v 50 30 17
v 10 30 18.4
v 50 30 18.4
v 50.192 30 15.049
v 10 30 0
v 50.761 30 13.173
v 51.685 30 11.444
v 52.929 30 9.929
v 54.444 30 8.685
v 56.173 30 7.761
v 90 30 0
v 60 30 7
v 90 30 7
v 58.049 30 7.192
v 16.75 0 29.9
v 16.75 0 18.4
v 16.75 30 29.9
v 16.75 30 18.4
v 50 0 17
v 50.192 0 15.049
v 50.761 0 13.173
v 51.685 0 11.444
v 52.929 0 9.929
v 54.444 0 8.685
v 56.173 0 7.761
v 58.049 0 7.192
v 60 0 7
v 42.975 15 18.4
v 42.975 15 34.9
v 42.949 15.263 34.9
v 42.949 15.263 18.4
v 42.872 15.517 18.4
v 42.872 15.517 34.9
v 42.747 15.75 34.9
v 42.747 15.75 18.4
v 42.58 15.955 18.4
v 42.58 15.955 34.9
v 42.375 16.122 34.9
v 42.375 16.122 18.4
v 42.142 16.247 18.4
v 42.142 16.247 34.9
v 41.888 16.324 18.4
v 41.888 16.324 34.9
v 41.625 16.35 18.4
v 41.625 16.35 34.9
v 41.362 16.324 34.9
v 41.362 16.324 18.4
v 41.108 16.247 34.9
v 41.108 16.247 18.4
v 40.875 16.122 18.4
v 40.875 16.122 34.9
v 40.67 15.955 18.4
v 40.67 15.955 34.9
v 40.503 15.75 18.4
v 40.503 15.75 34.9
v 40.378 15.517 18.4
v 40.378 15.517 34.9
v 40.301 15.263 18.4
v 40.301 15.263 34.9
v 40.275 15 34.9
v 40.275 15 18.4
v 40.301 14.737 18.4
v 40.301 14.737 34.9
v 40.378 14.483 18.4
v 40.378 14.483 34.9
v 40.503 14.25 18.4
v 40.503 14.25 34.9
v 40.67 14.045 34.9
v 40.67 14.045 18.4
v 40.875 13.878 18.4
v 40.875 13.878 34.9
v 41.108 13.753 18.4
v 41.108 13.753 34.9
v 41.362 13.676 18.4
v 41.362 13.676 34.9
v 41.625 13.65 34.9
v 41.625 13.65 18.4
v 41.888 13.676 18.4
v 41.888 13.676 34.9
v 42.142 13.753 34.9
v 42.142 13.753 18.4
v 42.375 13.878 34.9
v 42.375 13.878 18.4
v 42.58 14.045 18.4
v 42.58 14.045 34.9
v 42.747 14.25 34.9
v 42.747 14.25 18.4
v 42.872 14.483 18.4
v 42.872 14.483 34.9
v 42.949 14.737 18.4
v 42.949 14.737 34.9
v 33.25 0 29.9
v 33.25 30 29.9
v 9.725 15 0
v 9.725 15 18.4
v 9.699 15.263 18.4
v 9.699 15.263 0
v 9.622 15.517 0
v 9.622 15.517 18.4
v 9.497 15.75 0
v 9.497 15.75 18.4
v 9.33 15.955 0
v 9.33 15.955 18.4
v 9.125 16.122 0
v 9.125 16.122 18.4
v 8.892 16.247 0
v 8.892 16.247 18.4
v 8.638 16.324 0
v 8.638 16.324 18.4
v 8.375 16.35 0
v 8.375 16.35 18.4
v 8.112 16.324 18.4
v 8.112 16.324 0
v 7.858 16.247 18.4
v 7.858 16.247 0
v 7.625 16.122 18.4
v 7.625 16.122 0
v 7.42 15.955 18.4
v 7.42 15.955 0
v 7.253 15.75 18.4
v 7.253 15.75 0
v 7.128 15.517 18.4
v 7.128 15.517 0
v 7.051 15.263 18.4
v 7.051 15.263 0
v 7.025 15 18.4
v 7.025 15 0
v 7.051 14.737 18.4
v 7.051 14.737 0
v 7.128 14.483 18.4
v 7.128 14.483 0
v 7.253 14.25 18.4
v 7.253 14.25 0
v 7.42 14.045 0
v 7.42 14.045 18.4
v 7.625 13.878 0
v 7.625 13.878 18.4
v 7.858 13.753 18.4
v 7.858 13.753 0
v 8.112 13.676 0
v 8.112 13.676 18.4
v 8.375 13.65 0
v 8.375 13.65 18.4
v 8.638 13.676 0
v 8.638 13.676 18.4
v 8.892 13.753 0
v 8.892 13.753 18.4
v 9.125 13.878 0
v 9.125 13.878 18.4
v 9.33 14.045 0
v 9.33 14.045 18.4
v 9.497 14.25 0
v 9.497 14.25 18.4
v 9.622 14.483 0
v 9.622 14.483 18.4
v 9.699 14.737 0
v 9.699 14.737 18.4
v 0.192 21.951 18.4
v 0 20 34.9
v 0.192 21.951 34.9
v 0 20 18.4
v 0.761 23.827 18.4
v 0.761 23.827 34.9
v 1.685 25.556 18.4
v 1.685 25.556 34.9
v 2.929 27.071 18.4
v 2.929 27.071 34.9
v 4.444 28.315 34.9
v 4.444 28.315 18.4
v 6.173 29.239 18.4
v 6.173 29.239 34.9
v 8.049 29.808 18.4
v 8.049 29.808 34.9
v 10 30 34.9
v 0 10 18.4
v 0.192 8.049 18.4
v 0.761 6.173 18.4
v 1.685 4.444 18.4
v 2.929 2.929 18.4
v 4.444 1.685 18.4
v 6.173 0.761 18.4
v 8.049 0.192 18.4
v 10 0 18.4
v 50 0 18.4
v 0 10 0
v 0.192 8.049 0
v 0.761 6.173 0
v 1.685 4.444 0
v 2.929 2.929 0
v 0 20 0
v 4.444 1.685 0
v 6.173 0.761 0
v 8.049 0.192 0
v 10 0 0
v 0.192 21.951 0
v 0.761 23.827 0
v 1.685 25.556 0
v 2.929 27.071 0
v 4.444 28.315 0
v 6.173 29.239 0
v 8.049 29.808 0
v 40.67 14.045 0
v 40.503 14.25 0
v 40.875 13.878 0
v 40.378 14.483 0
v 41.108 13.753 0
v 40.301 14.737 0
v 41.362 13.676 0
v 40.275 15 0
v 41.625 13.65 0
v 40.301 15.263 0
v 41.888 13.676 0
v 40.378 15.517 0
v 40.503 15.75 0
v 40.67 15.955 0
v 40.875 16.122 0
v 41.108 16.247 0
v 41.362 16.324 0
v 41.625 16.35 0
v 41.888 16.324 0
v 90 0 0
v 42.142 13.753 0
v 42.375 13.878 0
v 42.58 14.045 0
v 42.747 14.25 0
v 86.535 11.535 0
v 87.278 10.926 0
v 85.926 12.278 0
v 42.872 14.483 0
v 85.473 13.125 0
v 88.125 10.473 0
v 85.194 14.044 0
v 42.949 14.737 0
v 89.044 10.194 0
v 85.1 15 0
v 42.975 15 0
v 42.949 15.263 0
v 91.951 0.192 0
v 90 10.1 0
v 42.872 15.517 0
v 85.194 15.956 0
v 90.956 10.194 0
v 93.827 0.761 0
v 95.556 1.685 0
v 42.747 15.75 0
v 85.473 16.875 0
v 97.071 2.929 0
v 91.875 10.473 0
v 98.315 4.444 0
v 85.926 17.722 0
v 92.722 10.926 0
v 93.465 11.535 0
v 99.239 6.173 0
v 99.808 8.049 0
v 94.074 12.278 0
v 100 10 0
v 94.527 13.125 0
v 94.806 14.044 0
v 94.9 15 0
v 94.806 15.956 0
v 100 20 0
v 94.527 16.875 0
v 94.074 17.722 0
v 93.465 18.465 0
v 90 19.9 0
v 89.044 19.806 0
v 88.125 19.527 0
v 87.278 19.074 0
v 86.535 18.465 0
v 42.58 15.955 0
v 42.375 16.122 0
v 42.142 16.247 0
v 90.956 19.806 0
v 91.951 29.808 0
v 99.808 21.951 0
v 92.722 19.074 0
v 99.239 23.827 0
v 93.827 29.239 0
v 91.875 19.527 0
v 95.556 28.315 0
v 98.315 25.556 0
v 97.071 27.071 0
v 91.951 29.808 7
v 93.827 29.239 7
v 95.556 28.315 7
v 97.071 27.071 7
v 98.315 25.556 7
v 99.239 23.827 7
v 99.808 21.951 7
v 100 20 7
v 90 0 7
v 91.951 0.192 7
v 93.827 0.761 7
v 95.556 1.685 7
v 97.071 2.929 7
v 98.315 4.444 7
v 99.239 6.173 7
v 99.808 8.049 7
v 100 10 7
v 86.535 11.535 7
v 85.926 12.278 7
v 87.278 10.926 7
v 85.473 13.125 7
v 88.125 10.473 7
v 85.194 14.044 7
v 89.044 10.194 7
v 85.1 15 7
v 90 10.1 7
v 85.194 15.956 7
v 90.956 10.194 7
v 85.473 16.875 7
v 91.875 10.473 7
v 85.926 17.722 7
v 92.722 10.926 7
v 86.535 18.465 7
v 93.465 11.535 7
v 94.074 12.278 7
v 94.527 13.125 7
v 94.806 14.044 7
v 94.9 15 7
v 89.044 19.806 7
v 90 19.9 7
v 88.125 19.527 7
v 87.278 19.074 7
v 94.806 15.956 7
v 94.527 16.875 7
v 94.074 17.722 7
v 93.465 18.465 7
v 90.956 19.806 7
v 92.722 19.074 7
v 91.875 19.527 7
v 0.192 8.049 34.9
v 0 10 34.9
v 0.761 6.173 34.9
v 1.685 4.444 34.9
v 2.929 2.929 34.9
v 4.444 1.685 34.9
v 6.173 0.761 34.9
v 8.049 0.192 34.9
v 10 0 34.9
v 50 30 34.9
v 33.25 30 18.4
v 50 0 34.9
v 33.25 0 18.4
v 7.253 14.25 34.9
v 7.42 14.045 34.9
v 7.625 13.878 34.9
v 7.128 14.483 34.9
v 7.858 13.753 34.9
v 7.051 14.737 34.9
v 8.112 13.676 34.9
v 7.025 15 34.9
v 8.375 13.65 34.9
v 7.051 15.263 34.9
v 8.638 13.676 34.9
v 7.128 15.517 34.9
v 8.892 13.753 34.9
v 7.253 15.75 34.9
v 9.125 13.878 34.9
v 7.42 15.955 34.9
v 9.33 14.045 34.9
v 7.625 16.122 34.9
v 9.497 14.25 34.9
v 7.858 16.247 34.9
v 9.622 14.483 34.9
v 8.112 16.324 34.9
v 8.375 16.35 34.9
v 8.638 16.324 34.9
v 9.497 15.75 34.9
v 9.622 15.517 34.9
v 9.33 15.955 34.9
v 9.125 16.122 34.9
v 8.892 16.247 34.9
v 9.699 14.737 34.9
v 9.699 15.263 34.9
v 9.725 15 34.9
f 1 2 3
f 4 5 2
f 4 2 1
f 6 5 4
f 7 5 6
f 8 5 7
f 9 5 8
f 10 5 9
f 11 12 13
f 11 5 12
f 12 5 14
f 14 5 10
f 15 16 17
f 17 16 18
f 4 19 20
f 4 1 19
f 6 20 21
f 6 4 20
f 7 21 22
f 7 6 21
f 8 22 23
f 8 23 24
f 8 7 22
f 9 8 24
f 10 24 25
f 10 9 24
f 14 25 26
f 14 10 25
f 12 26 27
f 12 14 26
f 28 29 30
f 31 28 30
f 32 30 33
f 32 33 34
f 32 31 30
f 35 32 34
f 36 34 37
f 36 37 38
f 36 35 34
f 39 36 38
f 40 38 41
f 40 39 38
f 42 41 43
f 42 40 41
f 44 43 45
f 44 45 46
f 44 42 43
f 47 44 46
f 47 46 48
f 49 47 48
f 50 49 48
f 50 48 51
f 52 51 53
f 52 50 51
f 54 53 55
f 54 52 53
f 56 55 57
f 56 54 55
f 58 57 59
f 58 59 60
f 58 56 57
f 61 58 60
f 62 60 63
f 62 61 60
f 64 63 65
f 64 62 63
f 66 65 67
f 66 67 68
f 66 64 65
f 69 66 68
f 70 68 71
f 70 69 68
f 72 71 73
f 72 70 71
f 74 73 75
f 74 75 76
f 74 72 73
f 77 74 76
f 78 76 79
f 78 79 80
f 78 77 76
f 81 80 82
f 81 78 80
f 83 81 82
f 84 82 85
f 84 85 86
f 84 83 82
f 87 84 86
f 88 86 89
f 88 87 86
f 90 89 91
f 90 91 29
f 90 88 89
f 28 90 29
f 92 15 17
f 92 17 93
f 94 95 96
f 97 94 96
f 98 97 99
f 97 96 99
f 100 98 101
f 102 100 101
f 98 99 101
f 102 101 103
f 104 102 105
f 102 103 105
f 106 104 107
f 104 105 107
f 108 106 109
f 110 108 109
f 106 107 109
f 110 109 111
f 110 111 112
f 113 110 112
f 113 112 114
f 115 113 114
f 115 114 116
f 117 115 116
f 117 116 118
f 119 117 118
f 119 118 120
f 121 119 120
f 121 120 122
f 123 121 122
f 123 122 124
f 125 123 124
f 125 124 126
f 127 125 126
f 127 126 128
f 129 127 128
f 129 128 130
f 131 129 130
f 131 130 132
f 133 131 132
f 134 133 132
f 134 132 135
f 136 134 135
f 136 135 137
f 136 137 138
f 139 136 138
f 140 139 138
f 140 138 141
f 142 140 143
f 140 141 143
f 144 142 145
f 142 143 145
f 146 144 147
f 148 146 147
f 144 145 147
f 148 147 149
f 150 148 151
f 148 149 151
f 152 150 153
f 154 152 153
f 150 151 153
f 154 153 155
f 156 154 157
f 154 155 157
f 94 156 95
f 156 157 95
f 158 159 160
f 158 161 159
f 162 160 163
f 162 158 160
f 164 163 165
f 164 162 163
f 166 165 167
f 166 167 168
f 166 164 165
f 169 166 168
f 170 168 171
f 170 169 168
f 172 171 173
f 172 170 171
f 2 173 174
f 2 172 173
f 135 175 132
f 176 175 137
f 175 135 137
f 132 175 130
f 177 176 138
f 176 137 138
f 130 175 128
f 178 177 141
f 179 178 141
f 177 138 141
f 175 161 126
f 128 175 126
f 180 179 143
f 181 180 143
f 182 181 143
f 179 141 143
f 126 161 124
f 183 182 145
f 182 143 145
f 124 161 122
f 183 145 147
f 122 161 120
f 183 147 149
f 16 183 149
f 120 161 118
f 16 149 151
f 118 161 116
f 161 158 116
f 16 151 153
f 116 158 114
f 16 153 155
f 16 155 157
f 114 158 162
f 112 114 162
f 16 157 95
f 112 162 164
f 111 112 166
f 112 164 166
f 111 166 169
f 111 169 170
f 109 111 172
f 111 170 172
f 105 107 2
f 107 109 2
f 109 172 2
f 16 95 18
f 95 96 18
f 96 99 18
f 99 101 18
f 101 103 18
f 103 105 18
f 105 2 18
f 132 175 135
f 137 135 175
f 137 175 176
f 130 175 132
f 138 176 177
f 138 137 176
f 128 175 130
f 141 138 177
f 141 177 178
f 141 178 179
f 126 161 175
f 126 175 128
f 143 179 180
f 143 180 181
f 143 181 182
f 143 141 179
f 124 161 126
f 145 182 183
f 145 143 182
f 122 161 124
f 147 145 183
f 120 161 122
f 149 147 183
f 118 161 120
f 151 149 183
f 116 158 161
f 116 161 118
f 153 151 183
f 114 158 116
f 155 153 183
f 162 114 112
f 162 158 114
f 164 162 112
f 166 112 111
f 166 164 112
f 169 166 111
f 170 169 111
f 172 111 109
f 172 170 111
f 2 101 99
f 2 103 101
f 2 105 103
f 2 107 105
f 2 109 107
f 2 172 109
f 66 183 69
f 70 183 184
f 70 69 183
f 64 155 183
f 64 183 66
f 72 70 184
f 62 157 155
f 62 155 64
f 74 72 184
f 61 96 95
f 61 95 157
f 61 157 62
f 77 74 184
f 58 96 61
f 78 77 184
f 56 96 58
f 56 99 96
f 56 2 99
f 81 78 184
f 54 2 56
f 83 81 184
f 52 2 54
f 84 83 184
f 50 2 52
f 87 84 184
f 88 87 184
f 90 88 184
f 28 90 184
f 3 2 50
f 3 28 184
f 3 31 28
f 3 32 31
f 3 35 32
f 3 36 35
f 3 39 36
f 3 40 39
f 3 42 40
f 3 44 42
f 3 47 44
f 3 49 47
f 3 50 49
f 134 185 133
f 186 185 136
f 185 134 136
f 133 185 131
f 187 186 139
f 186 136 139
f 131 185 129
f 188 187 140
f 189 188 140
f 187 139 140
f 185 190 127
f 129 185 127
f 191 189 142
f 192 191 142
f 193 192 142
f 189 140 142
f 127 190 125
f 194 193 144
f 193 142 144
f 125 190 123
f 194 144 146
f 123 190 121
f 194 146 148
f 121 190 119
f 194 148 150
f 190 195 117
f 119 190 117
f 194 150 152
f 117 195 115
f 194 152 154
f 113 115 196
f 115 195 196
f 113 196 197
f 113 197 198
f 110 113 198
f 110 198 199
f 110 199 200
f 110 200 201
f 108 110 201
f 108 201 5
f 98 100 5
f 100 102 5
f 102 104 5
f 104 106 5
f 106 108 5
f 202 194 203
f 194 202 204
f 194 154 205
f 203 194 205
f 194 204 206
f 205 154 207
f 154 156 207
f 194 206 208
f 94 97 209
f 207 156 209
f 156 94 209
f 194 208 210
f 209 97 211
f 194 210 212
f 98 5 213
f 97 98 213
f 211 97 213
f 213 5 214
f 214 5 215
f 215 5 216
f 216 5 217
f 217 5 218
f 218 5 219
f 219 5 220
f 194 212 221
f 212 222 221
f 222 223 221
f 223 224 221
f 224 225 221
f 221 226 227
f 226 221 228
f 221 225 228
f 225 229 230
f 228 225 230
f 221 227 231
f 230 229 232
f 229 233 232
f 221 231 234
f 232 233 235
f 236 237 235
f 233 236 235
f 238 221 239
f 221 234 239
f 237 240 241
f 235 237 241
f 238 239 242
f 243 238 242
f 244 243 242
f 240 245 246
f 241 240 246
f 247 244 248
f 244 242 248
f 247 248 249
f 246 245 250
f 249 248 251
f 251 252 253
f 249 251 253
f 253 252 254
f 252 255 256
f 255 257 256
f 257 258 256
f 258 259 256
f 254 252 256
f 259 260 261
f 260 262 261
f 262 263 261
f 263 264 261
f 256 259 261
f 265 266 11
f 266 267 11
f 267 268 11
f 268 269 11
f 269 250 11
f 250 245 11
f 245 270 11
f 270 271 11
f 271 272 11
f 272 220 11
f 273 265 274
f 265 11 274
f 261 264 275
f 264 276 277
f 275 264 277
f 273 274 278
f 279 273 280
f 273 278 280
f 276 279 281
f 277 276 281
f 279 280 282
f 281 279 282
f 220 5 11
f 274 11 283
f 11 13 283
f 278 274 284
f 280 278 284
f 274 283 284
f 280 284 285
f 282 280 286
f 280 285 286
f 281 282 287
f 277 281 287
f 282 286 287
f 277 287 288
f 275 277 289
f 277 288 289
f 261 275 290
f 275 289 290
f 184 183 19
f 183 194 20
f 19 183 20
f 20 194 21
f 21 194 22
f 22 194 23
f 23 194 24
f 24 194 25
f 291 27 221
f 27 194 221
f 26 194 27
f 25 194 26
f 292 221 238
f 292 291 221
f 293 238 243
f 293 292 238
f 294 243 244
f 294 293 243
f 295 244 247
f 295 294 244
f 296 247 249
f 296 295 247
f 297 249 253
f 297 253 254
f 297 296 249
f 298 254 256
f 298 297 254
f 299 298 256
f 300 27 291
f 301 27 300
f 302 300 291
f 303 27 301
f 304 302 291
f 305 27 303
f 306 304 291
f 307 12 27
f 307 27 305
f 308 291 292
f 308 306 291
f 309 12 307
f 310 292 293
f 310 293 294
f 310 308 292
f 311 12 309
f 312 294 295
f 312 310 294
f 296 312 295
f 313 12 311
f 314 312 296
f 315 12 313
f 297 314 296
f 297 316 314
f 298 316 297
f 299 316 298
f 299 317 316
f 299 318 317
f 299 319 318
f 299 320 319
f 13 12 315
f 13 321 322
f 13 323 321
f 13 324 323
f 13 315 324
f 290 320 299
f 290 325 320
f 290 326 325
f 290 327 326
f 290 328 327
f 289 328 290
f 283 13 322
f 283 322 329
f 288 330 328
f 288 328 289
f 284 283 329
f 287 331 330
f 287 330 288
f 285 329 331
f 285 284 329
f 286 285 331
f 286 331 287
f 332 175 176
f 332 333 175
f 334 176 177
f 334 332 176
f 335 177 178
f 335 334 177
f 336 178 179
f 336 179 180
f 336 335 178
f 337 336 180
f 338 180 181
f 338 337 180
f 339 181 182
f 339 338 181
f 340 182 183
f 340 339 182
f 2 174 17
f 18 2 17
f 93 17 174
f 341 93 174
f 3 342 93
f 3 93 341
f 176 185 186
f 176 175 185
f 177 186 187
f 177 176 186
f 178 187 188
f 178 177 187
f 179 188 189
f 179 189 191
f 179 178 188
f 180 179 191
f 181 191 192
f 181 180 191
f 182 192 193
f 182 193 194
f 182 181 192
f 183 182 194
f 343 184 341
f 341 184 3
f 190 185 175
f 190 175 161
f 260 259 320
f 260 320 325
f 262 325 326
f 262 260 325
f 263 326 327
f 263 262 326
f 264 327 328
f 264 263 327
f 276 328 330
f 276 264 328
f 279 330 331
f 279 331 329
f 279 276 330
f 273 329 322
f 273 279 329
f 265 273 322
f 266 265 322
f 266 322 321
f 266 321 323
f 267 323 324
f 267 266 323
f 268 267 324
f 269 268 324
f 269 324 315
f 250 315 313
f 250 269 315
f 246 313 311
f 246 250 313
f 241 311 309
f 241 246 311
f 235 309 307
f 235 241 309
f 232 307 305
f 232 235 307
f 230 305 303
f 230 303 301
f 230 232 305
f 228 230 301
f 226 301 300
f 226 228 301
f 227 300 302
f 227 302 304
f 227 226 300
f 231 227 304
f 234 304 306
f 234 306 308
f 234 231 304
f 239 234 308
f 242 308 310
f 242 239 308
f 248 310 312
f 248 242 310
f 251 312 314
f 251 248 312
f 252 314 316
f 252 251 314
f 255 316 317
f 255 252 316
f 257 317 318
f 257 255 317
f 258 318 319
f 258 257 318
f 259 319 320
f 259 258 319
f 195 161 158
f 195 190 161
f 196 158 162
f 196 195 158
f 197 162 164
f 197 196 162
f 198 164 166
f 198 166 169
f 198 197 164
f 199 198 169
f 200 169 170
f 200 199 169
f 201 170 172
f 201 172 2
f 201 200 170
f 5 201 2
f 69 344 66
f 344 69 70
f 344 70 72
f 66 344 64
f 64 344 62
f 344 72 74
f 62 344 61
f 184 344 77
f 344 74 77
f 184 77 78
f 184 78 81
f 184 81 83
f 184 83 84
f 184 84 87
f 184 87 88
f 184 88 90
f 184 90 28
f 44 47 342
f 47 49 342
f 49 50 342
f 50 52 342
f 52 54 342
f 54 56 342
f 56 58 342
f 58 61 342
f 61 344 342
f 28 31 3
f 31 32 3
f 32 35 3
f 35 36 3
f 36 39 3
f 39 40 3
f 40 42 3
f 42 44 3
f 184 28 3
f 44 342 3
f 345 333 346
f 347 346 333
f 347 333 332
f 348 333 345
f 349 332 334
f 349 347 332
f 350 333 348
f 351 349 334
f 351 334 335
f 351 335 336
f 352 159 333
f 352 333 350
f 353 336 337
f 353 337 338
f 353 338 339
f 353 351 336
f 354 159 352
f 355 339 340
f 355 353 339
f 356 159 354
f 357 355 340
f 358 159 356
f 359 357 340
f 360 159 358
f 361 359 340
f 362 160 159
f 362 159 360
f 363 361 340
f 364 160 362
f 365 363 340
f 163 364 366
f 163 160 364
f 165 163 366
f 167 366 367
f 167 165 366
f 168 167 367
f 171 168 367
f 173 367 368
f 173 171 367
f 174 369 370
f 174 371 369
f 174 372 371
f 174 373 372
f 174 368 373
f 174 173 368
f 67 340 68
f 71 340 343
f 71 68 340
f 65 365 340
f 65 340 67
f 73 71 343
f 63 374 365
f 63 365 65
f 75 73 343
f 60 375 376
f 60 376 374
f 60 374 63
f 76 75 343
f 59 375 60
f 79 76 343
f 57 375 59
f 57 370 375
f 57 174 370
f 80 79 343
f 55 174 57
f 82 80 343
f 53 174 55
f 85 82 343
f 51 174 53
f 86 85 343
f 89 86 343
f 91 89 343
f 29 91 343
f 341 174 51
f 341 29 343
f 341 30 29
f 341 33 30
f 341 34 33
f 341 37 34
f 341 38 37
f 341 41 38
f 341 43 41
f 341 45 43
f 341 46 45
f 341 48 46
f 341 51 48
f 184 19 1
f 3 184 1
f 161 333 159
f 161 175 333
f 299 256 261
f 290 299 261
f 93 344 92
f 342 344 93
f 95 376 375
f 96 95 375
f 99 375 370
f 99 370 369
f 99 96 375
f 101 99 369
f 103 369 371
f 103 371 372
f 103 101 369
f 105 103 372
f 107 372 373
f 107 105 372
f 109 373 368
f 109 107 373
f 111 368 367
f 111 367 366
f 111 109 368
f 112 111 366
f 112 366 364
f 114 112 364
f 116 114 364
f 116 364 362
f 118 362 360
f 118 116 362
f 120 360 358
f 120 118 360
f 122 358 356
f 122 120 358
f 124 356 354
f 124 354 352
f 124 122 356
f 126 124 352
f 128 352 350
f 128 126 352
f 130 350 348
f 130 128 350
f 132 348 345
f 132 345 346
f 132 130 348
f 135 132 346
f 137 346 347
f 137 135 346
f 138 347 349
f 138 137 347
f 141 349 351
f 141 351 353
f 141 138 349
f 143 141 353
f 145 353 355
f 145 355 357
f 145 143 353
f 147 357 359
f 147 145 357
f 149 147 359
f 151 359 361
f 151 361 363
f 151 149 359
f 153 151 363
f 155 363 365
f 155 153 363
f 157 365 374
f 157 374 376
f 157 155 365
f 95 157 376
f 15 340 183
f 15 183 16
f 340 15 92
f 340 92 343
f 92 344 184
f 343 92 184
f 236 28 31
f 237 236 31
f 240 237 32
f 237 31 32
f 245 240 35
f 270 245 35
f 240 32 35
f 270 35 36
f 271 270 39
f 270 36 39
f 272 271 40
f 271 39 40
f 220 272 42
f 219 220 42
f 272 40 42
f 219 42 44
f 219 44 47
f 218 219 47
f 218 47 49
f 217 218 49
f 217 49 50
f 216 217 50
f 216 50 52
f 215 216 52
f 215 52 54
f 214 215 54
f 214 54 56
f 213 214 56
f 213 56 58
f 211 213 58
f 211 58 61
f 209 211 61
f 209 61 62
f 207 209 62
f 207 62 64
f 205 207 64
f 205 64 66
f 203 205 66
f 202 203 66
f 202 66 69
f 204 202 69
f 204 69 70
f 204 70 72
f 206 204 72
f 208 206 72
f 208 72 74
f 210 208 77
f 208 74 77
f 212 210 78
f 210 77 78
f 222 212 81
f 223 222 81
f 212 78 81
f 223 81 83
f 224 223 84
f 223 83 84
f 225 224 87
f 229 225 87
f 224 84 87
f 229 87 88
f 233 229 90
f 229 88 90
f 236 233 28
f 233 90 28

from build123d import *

# Parameters (mm, degrees)
SKETCH1_W             = 50
SKETCH1_H             = 30
BOSS_EXTRUDE1_DEPTH   = 18.4
SKETCH1_3_W           = 50
SKETCH1_3_H           = 30
SKETCH1_3_R           = 4.9
BOSS_EXTRUDE2_DEPTH   = 7
SKETCH2_R             = 1.35
CUT_EXTRUDE1_DEPTH    = 27
SKETCH2_3_W           = 16.75
SKETCH2_3_H           = 30
SKETCH2_3_R           = 1.35
BOSS_EXTRUDE3_DEPTH   = 11.5
BOSS_EXTRUDE3_2_DEPTH = 11.5
BOSS_EXTRUDE4_START   = 5
SKETCH3_W             = 50
SKETCH3_H             = 30
SKETCH3_R             = 1.35
BOSS_EXTRUDE4_DEPTH   = 5
FILLET1_R             = 10
FILLET2_R             = 10


with BuildPart() as part:
    # Sketch1 → Boss-Extrude1 (new body)
    with BuildSketch(Plane.XY):
        with Locations((25, 15)):
            Rectangle(SKETCH1_W, SKETCH1_H)
    extrude(amount=BOSS_EXTRUDE1_DEPTH)

    # Sketch1<3> → Boss-Extrude2 (add)
    with BuildSketch(Plane.XY):
        with Locations((75, 15)):
            Rectangle(SKETCH1_3_W, SKETCH1_3_H)
        with Locations((90, 15)):
            Circle(SKETCH1_3_R, mode=Mode.SUBTRACT)
    extrude(amount=BOSS_EXTRUDE2_DEPTH)

    # Sketch2 → Cut-Extrude1 (cut)
    with BuildSketch(Plane.XY.offset(18.4)):
        with Locations((8.375, 15)):
            Circle(SKETCH2_R)
        with Locations((41.625, 15)):
            Circle(SKETCH2_R)
    extrude(amount=-CUT_EXTRUDE1_DEPTH, mode=Mode.SUBTRACT)

    # Fillet1
    fillet1_edges = [part.edges().sort_by_distance(p)[0] for p in [
        (0, 30, 9.2),
        (0, 0, 9.2),
        (100, 30, 3.5),
        (100, 0, 3.5),
        (50, 15, 7),
    ]]
    fillet(fillet1_edges, radius=FILLET1_R)


with BuildPart() as body_2:
    # Sketch2<3> → Boss-Extrude3 (new body)
    with BuildSketch(Plane.XY.offset(18.4)):
        with Locations((8.375, 15)):
            Rectangle(SKETCH2_3_W, SKETCH2_3_H)
        with Locations((8.375, 15)):
            Circle(SKETCH2_3_R, mode=Mode.SUBTRACT)
    extrude(amount=BOSS_EXTRUDE3_DEPTH)



with BuildPart() as body_3:
    # Sketch2<3> → Boss-Extrude3 2 (new body)
    with BuildSketch(Plane.XY.offset(18.4)):
        with Locations((41.625, 15)):
            Rectangle(SKETCH2_3_W, SKETCH2_3_H)
        with Locations((41.625, 15)):
            Circle(SKETCH2_3_R, mode=Mode.SUBTRACT)
    extrude(amount=BOSS_EXTRUDE3_2_DEPTH)


with BuildPart() as body_2_1:
    add(body_2.part)

    add(body_3.part)  # Boss-Extrude4 merges body 3
    # Sketch3 → Boss-Extrude4 (add)
    with BuildSketch(Plane.XY.offset(29.9).offset(BOSS_EXTRUDE4_START)):
        with Locations((25, 15)):
            Rectangle(SKETCH3_W, SKETCH3_H)
        with Locations((8.375, 15)):
            Circle(SKETCH3_R, mode=Mode.SUBTRACT)
        with Locations((41.625, 15)):
            Circle(SKETCH3_R, mode=Mode.SUBTRACT)
    extrude(amount=-BOSS_EXTRUDE4_DEPTH)

    # Fillet2
    fillet2_edges = [body_2_1.edges().sort_by_distance(p)[0] for p in [
        (0, 30, 26.65),
        (0, 0, 26.65),
    ]]
    fillet(fillet2_edges, radius=FILLET2_R)


solid = Compound([part.part, body_2_1.part])
